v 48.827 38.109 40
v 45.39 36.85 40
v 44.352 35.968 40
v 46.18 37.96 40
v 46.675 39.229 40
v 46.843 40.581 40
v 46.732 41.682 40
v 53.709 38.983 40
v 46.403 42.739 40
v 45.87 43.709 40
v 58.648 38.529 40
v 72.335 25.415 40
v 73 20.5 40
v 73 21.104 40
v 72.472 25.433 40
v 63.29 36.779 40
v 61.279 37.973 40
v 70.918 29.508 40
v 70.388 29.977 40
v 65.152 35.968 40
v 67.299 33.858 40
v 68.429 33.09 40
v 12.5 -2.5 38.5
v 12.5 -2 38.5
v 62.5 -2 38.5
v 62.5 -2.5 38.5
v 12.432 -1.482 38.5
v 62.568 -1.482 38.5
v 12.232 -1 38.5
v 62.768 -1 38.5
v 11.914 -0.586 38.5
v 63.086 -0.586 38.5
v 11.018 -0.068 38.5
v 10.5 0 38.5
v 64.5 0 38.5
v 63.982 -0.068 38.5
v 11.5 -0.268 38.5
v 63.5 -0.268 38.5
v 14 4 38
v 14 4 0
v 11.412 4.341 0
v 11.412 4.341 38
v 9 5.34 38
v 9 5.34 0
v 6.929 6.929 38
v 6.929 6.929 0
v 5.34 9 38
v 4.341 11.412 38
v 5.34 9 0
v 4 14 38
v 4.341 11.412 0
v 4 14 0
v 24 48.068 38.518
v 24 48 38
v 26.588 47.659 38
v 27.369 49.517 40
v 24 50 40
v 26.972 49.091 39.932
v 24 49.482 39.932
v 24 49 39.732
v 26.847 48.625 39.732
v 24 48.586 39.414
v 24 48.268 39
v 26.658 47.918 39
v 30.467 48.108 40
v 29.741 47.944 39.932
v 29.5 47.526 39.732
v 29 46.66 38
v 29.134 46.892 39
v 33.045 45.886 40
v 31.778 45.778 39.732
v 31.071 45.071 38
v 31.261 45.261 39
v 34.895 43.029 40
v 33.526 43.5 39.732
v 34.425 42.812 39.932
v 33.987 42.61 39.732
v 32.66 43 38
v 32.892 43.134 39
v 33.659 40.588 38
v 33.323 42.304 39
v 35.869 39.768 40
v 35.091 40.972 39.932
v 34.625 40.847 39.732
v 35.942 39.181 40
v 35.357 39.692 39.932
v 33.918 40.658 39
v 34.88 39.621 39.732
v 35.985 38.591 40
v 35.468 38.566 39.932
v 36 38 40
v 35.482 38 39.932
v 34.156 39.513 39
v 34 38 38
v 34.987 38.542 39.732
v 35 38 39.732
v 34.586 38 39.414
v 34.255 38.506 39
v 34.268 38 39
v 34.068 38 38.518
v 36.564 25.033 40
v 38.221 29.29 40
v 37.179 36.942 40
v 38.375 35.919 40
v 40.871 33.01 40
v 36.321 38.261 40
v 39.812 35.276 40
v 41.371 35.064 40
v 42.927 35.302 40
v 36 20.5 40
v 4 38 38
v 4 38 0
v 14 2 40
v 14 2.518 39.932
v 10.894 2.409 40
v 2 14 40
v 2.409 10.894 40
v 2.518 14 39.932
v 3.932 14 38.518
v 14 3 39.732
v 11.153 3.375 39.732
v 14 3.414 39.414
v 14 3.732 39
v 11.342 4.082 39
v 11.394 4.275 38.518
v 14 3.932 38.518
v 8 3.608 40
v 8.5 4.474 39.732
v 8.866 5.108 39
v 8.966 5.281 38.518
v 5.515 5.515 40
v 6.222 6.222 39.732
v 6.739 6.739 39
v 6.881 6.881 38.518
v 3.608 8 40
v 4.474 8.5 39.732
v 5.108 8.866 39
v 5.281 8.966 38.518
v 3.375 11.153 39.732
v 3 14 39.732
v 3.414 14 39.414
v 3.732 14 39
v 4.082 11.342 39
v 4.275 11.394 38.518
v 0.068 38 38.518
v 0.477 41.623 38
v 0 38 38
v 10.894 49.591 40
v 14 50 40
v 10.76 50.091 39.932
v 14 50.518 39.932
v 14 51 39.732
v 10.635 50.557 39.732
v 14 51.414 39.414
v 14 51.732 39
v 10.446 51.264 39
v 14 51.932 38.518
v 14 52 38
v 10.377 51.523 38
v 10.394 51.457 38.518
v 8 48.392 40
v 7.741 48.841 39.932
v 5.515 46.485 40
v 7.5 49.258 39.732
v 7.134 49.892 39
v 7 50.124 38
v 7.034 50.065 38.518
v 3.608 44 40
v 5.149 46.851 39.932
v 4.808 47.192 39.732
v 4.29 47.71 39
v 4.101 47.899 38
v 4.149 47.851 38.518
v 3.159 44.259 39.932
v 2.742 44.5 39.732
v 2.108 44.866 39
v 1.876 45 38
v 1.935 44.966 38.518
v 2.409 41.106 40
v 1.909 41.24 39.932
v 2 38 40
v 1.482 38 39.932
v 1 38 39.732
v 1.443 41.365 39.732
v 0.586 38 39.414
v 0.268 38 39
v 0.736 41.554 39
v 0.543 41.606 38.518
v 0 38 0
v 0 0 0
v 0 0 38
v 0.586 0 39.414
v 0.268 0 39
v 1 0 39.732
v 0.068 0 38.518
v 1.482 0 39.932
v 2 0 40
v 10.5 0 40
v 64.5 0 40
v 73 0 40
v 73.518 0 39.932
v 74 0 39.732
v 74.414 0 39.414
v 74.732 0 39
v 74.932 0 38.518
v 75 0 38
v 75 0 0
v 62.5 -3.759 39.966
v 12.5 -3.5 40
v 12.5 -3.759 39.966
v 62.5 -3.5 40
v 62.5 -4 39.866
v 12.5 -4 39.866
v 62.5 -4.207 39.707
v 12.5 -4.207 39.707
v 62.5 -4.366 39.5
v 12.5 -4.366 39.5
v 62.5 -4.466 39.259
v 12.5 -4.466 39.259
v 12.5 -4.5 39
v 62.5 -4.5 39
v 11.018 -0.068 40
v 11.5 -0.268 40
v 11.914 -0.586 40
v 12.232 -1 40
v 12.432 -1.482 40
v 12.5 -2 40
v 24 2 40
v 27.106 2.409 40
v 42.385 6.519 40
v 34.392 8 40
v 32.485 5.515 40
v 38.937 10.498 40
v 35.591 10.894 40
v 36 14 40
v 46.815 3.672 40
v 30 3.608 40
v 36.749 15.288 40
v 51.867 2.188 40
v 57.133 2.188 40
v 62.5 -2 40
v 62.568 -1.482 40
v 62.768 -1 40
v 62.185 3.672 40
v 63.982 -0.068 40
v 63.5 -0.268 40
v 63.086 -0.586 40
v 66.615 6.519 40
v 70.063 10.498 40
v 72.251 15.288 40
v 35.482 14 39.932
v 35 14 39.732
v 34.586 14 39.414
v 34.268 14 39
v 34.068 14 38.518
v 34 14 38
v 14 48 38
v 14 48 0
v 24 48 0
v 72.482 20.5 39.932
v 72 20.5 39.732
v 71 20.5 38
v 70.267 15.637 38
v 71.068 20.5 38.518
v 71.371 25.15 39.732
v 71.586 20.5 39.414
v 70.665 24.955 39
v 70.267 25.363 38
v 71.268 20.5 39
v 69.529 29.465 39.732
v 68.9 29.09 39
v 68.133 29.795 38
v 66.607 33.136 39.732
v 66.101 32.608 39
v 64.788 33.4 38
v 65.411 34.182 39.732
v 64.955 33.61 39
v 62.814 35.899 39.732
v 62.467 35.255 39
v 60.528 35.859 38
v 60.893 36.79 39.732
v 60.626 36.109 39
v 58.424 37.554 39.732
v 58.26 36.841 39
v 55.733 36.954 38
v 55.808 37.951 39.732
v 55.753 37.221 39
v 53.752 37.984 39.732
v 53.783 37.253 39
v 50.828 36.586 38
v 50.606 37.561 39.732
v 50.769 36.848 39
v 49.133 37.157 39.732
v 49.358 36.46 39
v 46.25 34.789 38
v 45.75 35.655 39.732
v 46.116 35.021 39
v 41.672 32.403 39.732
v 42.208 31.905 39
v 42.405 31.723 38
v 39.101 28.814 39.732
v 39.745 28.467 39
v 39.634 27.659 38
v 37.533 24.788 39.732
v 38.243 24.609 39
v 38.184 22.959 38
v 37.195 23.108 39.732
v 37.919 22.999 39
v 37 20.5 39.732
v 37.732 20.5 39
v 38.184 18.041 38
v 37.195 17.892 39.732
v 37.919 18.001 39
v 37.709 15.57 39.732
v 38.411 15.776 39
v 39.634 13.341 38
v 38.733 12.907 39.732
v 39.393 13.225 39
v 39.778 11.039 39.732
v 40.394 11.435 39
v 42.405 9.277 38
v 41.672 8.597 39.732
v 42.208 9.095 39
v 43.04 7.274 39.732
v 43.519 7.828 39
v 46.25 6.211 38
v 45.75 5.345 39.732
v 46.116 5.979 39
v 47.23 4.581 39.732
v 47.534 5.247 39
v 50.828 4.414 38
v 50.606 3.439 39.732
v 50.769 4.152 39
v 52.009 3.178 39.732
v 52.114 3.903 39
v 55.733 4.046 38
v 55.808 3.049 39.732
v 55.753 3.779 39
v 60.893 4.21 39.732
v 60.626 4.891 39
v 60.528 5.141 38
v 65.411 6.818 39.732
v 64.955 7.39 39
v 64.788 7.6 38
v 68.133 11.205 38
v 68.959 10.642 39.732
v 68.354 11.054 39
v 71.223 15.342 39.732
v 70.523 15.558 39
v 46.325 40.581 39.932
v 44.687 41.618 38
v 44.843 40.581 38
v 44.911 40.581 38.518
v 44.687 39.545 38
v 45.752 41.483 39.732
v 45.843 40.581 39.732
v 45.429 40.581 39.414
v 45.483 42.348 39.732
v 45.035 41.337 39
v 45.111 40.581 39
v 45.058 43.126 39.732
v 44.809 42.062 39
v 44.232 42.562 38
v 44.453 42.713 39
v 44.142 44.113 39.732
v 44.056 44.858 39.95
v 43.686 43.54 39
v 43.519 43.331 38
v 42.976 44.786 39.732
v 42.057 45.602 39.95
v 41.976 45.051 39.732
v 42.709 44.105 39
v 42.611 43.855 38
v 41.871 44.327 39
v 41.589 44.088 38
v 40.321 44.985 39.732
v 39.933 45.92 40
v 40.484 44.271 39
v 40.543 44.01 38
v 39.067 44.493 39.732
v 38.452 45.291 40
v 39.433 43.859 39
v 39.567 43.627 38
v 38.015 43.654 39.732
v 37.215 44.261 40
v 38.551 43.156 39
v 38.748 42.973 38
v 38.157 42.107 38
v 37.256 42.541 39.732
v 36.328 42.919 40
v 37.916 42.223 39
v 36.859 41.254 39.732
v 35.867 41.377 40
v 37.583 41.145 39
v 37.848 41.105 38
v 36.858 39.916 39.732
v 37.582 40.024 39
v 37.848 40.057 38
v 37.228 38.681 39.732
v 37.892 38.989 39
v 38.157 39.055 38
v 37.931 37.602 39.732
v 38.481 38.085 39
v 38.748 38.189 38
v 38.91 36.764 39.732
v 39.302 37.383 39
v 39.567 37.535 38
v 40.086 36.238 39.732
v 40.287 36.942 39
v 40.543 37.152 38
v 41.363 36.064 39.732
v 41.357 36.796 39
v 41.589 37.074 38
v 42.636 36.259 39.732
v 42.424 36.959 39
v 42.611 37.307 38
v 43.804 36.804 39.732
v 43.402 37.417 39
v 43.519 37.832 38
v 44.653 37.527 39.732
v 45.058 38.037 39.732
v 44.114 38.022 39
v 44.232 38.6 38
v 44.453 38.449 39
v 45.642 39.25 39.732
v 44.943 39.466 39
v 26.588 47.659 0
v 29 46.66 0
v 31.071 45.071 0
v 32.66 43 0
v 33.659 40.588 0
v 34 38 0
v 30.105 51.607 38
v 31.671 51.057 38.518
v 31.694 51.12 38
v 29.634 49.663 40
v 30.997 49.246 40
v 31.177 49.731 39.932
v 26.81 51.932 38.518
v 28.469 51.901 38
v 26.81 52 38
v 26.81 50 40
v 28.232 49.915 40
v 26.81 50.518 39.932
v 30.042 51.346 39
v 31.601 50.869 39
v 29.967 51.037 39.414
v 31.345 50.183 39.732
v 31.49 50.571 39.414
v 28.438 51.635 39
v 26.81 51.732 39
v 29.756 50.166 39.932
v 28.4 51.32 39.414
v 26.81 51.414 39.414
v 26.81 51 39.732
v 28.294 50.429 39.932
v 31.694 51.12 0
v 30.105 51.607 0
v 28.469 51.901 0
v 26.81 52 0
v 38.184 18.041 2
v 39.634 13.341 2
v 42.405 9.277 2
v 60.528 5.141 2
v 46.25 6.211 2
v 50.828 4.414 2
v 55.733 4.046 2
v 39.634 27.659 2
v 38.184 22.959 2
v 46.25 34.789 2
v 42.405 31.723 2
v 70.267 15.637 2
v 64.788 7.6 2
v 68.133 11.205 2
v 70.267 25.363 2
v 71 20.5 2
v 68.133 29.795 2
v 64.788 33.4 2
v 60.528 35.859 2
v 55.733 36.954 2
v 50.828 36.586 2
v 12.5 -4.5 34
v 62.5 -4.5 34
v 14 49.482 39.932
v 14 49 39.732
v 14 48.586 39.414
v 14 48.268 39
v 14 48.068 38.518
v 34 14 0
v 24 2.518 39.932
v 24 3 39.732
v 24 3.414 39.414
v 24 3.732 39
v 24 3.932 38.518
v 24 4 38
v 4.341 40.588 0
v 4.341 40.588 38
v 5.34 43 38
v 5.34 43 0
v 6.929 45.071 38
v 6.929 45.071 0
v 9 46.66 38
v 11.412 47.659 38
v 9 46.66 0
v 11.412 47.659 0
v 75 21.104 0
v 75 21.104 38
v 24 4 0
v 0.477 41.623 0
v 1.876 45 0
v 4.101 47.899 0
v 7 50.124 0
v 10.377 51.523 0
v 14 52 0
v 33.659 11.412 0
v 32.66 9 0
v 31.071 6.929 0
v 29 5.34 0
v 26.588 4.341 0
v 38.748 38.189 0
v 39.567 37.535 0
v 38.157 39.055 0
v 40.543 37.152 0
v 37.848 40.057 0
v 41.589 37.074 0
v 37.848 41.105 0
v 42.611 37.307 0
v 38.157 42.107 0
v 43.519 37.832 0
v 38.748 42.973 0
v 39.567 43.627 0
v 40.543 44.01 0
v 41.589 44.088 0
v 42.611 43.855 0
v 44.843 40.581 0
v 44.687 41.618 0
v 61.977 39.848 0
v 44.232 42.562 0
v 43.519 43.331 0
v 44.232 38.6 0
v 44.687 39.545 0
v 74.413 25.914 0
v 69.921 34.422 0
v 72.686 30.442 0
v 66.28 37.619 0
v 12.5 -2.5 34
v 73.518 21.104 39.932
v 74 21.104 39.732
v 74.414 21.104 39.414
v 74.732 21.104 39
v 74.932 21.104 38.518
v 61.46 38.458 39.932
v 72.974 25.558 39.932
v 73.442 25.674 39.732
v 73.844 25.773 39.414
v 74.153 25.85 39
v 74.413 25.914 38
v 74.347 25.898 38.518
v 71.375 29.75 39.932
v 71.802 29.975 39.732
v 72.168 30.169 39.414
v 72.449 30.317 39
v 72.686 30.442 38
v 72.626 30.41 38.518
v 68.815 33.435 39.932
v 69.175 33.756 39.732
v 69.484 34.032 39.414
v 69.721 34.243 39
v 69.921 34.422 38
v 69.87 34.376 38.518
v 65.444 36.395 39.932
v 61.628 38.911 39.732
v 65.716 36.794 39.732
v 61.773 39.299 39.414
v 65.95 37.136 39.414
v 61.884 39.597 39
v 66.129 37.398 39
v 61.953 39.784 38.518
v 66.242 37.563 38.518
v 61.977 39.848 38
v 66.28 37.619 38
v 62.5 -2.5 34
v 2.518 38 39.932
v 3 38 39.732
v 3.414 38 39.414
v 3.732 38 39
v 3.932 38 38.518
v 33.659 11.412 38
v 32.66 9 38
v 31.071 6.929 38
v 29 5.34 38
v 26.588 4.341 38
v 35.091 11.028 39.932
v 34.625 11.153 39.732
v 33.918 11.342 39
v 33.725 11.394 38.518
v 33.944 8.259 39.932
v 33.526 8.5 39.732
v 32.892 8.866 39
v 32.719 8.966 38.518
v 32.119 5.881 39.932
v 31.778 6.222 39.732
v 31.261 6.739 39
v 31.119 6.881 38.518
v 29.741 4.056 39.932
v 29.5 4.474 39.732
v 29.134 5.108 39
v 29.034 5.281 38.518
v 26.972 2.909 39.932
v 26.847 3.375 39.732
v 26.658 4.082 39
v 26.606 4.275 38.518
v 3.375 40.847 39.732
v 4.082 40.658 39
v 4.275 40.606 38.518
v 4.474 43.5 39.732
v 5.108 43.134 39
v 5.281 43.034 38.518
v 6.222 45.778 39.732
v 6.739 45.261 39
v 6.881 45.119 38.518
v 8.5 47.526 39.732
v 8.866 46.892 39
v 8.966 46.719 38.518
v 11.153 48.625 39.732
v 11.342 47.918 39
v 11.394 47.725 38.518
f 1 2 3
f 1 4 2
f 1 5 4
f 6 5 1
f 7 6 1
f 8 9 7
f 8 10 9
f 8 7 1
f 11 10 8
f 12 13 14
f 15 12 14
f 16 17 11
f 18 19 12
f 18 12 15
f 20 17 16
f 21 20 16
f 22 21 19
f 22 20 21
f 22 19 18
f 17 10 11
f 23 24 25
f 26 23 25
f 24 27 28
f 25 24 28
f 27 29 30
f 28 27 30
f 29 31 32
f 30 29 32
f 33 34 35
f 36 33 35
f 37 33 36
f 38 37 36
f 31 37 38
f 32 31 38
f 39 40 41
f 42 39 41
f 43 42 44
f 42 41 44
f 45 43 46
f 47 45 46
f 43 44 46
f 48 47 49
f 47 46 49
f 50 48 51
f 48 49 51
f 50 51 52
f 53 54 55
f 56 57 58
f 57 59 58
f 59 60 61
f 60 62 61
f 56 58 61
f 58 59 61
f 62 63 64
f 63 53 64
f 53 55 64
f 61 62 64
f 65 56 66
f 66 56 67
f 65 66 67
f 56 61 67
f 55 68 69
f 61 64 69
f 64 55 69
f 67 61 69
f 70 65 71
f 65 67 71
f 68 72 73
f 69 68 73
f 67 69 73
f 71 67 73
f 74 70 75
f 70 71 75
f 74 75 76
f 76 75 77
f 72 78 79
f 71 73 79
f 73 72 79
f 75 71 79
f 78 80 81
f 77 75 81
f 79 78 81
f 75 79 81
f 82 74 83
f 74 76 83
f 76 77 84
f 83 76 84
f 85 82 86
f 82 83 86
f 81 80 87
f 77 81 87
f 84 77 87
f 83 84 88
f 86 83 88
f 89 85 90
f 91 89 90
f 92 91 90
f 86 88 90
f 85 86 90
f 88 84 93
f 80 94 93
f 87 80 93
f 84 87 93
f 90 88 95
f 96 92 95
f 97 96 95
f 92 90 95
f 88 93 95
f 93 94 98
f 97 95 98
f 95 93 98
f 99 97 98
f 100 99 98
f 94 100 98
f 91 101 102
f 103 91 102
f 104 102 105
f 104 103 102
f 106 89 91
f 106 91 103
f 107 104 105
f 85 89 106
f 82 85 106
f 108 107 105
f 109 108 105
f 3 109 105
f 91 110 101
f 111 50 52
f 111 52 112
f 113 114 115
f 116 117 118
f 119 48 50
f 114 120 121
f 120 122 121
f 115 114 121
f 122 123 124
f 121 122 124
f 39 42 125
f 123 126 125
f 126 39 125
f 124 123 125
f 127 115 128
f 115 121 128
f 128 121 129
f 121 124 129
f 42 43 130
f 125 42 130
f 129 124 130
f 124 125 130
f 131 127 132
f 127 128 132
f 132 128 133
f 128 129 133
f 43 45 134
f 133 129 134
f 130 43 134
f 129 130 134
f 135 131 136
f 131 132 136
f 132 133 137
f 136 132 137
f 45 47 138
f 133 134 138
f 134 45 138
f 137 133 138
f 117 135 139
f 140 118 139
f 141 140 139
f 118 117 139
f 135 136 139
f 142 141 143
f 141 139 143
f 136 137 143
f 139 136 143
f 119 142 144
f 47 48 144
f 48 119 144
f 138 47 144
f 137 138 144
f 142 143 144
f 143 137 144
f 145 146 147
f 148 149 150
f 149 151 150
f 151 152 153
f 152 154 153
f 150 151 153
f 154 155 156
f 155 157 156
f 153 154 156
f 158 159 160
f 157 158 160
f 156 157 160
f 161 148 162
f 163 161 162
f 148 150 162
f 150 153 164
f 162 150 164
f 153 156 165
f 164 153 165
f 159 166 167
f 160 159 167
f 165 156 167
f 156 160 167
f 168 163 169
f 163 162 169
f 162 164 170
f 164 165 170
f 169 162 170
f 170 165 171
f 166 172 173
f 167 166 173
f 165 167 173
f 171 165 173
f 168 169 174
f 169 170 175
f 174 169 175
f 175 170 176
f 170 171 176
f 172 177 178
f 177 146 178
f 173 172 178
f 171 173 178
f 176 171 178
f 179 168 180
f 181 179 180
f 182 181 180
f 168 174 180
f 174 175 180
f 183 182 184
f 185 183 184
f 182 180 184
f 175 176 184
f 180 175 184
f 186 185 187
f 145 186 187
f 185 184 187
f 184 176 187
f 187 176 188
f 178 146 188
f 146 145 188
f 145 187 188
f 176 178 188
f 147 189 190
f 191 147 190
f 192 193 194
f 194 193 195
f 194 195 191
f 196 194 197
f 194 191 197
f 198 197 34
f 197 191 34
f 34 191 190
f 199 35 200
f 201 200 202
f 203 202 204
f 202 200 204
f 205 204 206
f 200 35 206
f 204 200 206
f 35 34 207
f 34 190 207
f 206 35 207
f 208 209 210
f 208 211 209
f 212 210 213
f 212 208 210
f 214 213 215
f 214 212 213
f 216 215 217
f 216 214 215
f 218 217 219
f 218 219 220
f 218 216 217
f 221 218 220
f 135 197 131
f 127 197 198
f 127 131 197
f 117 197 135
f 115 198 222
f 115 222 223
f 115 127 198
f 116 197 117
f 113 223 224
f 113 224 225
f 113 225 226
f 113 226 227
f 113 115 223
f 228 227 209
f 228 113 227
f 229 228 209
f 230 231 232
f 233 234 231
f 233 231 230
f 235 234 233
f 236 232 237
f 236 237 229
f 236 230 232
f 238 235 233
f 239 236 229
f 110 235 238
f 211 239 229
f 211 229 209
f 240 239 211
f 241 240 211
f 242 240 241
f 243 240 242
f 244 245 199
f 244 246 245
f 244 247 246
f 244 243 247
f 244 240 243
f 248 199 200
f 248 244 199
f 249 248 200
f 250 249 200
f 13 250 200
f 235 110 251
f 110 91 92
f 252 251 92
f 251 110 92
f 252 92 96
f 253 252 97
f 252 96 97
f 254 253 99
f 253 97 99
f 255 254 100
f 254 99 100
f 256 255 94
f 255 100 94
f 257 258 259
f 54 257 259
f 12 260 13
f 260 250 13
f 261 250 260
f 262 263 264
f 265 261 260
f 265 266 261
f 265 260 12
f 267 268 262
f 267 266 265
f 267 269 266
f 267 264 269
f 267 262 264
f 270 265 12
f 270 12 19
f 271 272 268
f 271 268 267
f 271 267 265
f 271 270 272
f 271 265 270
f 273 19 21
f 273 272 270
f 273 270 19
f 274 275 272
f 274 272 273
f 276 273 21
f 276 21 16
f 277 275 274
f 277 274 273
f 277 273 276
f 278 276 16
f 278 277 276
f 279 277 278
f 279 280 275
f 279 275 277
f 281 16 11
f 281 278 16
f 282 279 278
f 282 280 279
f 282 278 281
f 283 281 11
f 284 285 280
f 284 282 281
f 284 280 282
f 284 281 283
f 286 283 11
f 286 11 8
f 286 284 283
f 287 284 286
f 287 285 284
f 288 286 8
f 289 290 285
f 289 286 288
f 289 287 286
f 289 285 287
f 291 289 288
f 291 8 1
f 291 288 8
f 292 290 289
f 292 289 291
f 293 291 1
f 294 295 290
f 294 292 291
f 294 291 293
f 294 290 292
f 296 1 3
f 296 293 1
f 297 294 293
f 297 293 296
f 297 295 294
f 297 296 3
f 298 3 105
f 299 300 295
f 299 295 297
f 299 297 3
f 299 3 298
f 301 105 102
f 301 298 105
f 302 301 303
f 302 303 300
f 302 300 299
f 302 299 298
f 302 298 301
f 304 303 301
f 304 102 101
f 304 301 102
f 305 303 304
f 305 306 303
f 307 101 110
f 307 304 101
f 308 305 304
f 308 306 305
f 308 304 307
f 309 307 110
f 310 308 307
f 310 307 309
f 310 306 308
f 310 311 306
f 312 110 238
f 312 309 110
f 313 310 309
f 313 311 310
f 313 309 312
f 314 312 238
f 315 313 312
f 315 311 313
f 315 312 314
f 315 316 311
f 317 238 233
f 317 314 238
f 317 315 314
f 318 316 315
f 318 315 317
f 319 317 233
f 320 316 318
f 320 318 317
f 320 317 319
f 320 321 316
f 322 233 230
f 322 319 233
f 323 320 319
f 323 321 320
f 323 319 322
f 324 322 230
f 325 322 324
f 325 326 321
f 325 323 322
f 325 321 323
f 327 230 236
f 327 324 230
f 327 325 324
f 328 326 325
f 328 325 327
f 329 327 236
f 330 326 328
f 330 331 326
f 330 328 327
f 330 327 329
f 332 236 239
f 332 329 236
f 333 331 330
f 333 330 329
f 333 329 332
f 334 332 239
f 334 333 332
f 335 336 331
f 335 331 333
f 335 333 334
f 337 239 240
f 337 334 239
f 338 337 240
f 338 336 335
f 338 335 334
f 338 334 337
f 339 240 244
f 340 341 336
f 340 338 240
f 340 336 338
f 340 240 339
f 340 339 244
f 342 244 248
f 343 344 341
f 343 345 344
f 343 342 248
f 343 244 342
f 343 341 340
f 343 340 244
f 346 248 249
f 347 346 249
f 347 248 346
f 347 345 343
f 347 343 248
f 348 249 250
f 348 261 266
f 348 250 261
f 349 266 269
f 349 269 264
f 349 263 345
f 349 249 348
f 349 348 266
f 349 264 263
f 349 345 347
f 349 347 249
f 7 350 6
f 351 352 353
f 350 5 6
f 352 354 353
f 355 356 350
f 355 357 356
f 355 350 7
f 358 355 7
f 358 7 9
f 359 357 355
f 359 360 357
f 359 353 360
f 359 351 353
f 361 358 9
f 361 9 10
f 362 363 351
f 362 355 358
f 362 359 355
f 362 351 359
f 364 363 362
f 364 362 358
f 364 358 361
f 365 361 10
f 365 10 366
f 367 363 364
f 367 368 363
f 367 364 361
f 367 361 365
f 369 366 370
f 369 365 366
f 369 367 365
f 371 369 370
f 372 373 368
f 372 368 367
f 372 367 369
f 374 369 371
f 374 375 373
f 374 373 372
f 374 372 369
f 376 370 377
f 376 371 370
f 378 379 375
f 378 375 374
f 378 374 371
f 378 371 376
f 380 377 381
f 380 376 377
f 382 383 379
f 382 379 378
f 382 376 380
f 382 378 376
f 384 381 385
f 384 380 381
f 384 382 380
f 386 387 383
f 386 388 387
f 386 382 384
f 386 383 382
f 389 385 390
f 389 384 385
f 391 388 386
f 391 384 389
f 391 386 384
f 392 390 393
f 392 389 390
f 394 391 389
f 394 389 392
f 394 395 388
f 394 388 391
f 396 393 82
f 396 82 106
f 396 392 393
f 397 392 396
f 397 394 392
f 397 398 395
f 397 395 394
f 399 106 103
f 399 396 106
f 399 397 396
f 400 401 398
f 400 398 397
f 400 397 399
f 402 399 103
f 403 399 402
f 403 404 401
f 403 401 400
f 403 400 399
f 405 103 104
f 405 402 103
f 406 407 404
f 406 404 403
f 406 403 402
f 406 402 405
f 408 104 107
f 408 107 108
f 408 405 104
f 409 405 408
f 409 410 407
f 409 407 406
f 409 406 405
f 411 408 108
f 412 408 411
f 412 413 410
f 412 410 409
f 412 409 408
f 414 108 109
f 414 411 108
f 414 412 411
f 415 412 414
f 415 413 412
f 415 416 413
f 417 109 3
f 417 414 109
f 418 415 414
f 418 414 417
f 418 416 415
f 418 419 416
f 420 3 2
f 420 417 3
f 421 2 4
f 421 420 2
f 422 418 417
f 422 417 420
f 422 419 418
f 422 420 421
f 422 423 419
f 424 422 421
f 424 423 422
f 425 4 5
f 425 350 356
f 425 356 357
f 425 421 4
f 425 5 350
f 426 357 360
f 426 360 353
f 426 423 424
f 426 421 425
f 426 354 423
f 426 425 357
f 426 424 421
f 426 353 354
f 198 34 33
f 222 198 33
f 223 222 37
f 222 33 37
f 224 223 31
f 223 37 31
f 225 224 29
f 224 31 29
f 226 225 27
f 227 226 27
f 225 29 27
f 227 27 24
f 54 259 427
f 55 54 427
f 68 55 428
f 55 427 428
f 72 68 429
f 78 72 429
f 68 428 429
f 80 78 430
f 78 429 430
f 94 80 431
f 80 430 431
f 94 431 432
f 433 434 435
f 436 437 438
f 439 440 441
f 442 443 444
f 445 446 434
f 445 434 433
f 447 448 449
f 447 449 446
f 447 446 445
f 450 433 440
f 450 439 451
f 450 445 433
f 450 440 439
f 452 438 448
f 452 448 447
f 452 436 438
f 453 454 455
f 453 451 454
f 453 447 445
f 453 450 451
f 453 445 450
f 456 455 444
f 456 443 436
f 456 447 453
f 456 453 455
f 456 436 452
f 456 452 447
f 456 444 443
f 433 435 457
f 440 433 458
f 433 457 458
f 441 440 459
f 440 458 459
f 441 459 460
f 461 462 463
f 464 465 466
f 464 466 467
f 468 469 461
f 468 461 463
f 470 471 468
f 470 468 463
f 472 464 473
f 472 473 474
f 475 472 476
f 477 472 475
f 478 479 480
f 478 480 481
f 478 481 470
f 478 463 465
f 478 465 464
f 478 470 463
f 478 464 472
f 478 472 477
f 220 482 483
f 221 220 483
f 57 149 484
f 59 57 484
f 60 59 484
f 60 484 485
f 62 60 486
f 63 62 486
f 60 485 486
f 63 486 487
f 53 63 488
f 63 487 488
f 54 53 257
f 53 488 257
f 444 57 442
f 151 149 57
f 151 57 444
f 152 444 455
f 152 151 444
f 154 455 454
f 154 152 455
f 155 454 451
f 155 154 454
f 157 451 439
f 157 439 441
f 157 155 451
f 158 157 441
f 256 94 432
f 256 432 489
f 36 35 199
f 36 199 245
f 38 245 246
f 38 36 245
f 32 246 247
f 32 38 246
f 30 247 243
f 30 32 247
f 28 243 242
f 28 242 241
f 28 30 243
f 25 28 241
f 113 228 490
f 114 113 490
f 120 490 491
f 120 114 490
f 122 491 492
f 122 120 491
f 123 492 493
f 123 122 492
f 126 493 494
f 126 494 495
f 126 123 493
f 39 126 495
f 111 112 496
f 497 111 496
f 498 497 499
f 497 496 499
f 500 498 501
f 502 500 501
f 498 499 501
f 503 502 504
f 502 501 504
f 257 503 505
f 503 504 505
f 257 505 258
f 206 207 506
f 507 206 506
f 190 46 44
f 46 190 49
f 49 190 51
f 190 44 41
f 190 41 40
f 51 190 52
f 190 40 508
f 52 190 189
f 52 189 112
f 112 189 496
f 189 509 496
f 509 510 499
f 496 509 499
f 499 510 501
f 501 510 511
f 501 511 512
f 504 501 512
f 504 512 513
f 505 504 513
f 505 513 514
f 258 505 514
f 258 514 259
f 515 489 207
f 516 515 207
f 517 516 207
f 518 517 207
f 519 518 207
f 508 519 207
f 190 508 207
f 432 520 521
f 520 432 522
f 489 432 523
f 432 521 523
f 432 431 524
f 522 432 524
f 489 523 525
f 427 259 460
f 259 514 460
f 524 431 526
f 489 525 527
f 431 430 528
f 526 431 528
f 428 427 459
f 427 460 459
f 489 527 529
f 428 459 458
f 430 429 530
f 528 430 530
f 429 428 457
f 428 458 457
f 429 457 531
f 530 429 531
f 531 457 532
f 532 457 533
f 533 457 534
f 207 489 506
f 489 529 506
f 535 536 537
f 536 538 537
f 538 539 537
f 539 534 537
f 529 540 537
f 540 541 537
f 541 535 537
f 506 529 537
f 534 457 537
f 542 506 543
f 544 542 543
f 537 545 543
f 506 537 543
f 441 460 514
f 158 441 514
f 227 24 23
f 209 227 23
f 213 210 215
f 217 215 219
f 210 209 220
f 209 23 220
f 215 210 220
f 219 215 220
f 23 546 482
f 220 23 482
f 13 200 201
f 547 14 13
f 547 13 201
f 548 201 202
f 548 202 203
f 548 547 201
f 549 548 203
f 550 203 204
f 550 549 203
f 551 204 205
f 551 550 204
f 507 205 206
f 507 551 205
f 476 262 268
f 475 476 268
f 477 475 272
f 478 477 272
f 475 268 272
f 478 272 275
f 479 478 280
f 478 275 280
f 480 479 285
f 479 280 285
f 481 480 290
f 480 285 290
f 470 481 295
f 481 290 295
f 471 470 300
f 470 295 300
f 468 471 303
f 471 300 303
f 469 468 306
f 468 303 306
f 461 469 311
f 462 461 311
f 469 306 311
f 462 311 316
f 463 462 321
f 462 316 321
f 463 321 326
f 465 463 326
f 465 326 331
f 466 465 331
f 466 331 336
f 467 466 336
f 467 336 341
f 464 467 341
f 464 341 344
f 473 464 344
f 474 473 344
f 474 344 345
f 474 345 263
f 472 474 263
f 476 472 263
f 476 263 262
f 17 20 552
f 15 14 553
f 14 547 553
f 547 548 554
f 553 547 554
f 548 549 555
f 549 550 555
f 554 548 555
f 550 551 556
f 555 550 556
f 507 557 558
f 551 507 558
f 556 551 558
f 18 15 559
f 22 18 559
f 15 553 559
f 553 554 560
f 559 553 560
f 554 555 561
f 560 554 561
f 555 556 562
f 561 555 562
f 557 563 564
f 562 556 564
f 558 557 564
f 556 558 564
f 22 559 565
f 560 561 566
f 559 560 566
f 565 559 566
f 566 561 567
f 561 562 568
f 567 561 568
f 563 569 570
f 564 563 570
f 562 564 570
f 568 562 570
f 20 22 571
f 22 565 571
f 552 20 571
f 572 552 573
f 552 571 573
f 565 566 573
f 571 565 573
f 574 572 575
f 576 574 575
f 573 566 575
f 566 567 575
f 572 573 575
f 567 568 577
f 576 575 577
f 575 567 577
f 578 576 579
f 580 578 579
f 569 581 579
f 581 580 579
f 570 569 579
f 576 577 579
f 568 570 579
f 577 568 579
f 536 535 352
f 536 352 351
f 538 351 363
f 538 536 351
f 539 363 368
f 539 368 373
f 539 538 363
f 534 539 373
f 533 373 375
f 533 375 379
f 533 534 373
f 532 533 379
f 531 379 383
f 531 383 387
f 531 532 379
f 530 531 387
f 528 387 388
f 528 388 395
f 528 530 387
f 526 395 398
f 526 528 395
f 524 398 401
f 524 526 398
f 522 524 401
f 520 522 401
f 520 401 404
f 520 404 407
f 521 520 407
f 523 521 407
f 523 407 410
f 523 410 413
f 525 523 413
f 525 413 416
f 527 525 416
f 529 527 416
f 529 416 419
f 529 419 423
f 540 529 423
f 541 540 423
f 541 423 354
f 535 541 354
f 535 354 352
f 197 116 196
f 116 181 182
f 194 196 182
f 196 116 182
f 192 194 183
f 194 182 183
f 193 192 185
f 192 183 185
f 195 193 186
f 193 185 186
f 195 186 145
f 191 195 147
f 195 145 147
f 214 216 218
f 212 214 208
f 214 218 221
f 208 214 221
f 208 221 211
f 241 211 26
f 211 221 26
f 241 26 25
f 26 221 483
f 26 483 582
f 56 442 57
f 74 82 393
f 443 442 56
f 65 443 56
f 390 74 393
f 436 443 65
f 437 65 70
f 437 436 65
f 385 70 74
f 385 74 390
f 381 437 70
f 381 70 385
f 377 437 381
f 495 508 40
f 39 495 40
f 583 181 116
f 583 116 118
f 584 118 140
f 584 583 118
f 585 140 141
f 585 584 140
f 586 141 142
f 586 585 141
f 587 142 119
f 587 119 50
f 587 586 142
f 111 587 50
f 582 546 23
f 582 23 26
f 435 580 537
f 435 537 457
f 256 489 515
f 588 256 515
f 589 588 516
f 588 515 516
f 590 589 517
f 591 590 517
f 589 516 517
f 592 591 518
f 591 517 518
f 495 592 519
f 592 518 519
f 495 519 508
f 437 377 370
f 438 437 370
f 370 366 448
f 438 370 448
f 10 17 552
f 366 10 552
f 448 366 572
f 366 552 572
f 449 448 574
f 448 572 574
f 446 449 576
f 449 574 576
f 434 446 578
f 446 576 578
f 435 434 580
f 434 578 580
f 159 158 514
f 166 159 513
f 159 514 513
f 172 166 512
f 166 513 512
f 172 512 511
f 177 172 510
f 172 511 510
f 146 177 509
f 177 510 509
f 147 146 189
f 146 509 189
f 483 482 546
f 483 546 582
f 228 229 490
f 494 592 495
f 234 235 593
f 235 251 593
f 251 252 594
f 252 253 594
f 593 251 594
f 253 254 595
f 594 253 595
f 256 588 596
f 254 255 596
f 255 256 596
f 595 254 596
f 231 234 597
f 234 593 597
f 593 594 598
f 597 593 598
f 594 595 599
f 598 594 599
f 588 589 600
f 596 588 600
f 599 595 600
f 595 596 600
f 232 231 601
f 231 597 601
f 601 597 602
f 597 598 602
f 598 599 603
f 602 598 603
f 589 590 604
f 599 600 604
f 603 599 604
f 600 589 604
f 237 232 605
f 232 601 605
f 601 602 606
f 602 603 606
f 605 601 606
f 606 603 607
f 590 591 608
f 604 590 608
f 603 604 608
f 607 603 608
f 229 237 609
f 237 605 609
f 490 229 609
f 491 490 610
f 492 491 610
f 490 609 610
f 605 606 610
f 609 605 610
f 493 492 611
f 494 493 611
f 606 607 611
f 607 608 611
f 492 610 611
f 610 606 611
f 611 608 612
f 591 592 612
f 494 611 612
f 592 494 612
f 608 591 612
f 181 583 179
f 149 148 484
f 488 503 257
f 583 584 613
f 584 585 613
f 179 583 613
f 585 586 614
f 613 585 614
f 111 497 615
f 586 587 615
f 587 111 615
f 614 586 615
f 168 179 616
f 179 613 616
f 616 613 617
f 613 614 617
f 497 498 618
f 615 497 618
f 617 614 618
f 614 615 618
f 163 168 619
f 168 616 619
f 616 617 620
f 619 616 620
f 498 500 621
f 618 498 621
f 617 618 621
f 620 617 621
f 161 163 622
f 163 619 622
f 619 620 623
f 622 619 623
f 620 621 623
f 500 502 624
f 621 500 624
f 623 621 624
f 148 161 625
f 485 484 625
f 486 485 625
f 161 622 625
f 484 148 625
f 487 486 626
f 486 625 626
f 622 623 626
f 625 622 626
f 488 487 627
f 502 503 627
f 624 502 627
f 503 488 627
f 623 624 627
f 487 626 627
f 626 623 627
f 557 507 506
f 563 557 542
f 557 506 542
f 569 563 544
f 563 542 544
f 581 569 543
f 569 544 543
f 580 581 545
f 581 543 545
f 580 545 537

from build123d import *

# Parameters (mm, degrees)
F0_R         = 16.5
F0_R_2       = 3.5170103203
F1_DEPTH     = 40
F2_R         = 16.5
F3_DEPTH     = 38
F4_W         = 50
F4_H         = 34
F5_DEPTH     = 4.5
F6_W         = 50
F6_H         = 2.5
F7_DEPTH     = 4.5
F8_T1_DEPTH  = 1.5
F8_T3_DEPTH  = 24
F8_T5_DEPTH  = 32.3129968036
F8_T7_DEPTH  = 12.8102496977
F8_T9_DEPTH  = 43
F8_T11_DEPTH = 26.1042093904
F8_T13_DEPTH = 10
F8_T20_ANGLE = 69.5823366889
F8_T22_ANGLE = 20.4176633111
F8_T24_ANGLE = 90
F8_T26_ANGLE = 90
F8_T28_ANGLE = 90
F8_T30_ANGLE = 90
F8_T32_ANGLE = 90
F9_R         = 1


# Not quite as in the source:
# - a fillet or chamfer that OpenCascade refuses, or shapes differently, is made with other operations: its cross-section is extruded or revolved along the edge and cut away or added


with BuildPart() as f1:
    # F0 (on Top) → F1 (new body)
    with BuildSketch(Plane.XY):
        with BuildLine():
            Line((0, 38), (0, 0))
            Line((0, 0), (12.5, 0))
            Line((12.5, 0), (12.5, -4.5))
            Line((12.5, -4.5), (62.5, -4.5))
            Line((62.5, -4.5), (62.5, 0))
            Line((62.5, 0), (75, 0))
            Line((75, 0), (75, 21.1042093904))
            ThreePointArc((75, 21.1042093904), (71.4247434001, 32.5159491456), (61.9772195759, 39.8476991132))
            Line((61.9772195759, 39.8476991132), (31.6943034009, 51.120442806))
            ThreePointArc((31.6943034009, 51.120442806), (29.2915599077, 51.7783562025), (26.8102496977, 52))
            Line((26.8102496977, 52), (14, 52))
            ThreePointArc((14, 52), (4.1005050634, 47.8994949366), (0, 38))
        make_face()
        with Locations((54.5, 20.5)):
            Circle(F0_R, mode=Mode.SUBTRACT)
        with BuildLine():
            ThreePointArc((4, 38), (6.9289321881, 45.0710678119), (14, 48))
            Line((14, 48), (24, 48))
            ThreePointArc((24, 48), (31.0710678119, 45.0710678119), (34, 38))
            Line((34, 38), (34, 14))
            ThreePointArc((34, 14), (31.0710678119, 6.9289321881), (24, 4))
            Line((24, 4), (14, 4))
            ThreePointArc((14, 4), (6.9289321881, 6.9289321881), (4, 14))
            Line((4, 14), (4, 38))
        make_face(mode=Mode.SUBTRACT)
        with Locations((41.3257834749, 40.5812550323)):
            Circle(F0_R_2, mode=Mode.SUBTRACT)
        with Locations((54.5, 20.5)):
            Circle(F0_R)
    extrude(amount=F1_DEPTH)

    # F2 (on face) → F3 (cut)
    with BuildSketch(Plane.XY.offset(40)):
        with Locations((54.5, 20.5)):
            Circle(F2_R)
    extrude(amount=-F3_DEPTH, mode=Mode.SUBTRACT)

    # F4 (on face) → F5 (cut)
    with BuildSketch(Plane.XZ.offset(4.5)):
        with Locations((37.5, 17)):
            Rectangle(F4_W, F4_H)
    extrude(amount=-F5_DEPTH, mode=Mode.SUBTRACT)

    # F6 (on face) → F7 (cut)
    with BuildSketch(Plane(origin=(0, 0, 34), x_dir=(1, 0, 0), z_dir=(0, 0, -1))):
        with Locations((37.5, 1.25)):
            Rectangle(F6_W, F6_H)
    extrude(amount=-F7_DEPTH, mode=Mode.SUBTRACT)

    # F8: fillet of radius 2 on 6 edges, made by hand

    # F8_s2 → F8_t1 (join)
    with BuildSketch(Plane.XY.offset(38.5)):
        with BuildLine():
            ThreePointArc((10.5, 0), (11.9142135624, -0.5857864376), (12.5, -2))
            Line((12.5, -2), (12.5, 0))
            Line((12.5, 0), (10.5, 0))
        make_face()
        with BuildLine():
            ThreePointArc((64.5, 0), (63.0857864376, -0.5857864376), (62.5, -2))
            Line((62.5, -2), (62.5, 0))
            Line((62.5, 0), (64.5, 0))
        make_face()
    extrude(amount=F8_T1_DEPTH)

    # F8_s4 → F8_t3 (cut)
    with BuildSketch(Plane.XZ.offset(-38)):
        with BuildLine():
            ThreePointArc((36, 40), (34.5857864376, 39.4142135624), (34, 38))
            Line((34, 38), (34, 40))
            Line((34, 40), (36, 40))
        make_face()
        with BuildLine():
            ThreePointArc((2, 40), (3.4142135624, 39.4142135624), (4, 38))
            Line((4, 38), (4, 40))
            Line((4, 40), (2, 40))
        make_face()
    extrude(amount=F8_T3_DEPTH, mode=Mode.SUBTRACT)

    # F8_s6 → F8_t5 (cut)
    with BuildSketch(Plane(origin=(41.4063945876, -15.4134321387, 0), x_dir=(0, 0, 1), z_dir=(-0.9371744861, 0.3488609788, 0))):
        with BuildLine():
            ThreePointArc((40, 56.9656804247), (39.4142135624, 58.3798939871), (38, 58.9656804247))
            Line((38, 58.9656804247), (40, 58.9656804247))
            Line((40, 58.9656804247), (40, 56.9656804247))
        make_face()
    extrude(amount=F8_T5_DEPTH, mode=Mode.SUBTRACT)

    # F8_s8 → F8_t7 (cut)
    with BuildSketch(Plane.YZ.offset(14)):
        with BuildLine():
            ThreePointArc((50, 40), (51.4142135624, 39.4142135624), (52, 38))
            Line((52, 38), (52, 40))
            Line((52, 40), (50, 40))
        make_face()
    extrude(amount=F8_T7_DEPTH, mode=Mode.SUBTRACT)

    # F8_s10 → F8_t9 (cut)
    with BuildSketch(Plane.XZ.offset(-38)):
        with BuildLine():
            ThreePointArc((2, 40), (0.5857864376, 39.4142135624), (0, 38))
            Line((0, 38), (0, 40))
            Line((0, 40), (2, 40))
        make_face()
    extrude(amount=F8_T9_DEPTH, mode=Mode.SUBTRACT)

    # F8_s12 → F8_t11 (cut)
    with BuildSketch(Plane.XZ.offset(-21.1042093904)):
        with BuildLine():
            ThreePointArc((73, 40), (74.4142135624, 39.4142135624), (75, 38))
            Line((75, 38), (75, 40))
            Line((75, 40), (73, 40))
        make_face()
    extrude(amount=F8_T11_DEPTH, mode=Mode.SUBTRACT)

    # F8_s14 → F8_t13 (cut)
    with BuildSketch(Plane.YZ.offset(14)):
        with BuildLine():
            ThreePointArc((2, 40), (3.4142135624, 39.4142135624), (4, 38))
            Line((4, 38), (4, 40))
            Line((4, 40), (2, 40))
        make_face()
        with BuildLine():
            ThreePointArc((50, 40), (48.5857864376, 39.4142135624), (48, 38))
            Line((48, 38), (48, 40))
            Line((48, 40), (50, 40))
        make_face()
    extrude(amount=F8_T13_DEPTH, mode=Mode.SUBTRACT)

    # F8_s15 → F8_t16 (revolve, cut)
    with BuildSketch(Plane.XZ.offset(-20.5)):
        with BuildLine():
            ThreePointArc((73, 40), (71.5857864376, 39.4142135624), (71, 38))
            Line((71, 38), (71, 40))
            Line((71, 40), (73, 40))
        make_face()
    revolve(axis=Axis((54.5, 20.5, 40), (0, 0, 1)), mode=Mode.SUBTRACT)

    # F8_s17 → F8_t18 (revolve, cut)
    with BuildSketch(Plane.XZ.offset(-40.5812550323)):
        with BuildLine():
            ThreePointArc((46.8427937951, 40), (45.4285802328, 39.4142135624), (44.8427937951, 38))
            Line((44.8427937951, 38), (44.8427937951, 40))
            Line((44.8427937951, 40), (46.8427937951, 40))
        make_face()
    revolve(axis=Axis((41.3257834749, 40.5812550323, 40), (0, 0, 1)), mode=Mode.SUBTRACT)

    # F8_s19 → F8_t20 (revolve, cut)
    with BuildSketch(Plane.XZ.offset(-21.1042093904)):
        with BuildLine():
            ThreePointArc((73, 40), (74.4142135624, 39.4142135624), (75, 38))
            Line((75, 38), (75, 40))
            Line((75, 40), (73, 40))
        make_face()
    revolve(axis=Axis((55, 21.1042093904, 40), (0, 0, 1)), revolution_arc=F8_T20_ANGLE, mode=Mode.SUBTRACT)

    # F8_s21 → F8_t22 (revolve, cut)
    with BuildSketch(Plane(origin=(11.1234784125, -4.140688446, 0), x_dir=(0, 0, 1), z_dir=(0.9371744861, -0.3488609788, 0))):
        with BuildLine():
            ThreePointArc((38, -58.9656804247), (39.4142135624, -58.3798939871), (40, -56.9656804247))
            Line((40, -56.9656804247), (40, -58.9656804247))
            Line((40, -58.9656804247), (38, -58.9656804247))
        make_face()
    revolve(axis=Axis((26.8102496977, 38, 40), (0, 0, 1)), revolution_arc=F8_T22_ANGLE, mode=Mode.SUBTRACT)

    # F8_s23 → F8_t24 (revolve, cut)
    with BuildSketch(Plane.YZ.offset(14)):
        with BuildLine():
            ThreePointArc((50, 40), (51.4142135624, 39.4142135624), (52, 38))
            Line((52, 38), (52, 40))
            Line((52, 40), (50, 40))
        make_face()
    revolve(axis=Axis((14, 38, 40), (0, 0, 1)), revolution_arc=F8_T24_ANGLE, mode=Mode.SUBTRACT)

    # F8_s25 → F8_t26 (revolve, cut)
    with BuildSketch(Plane.YZ.offset(24)):
        with BuildLine():
            ThreePointArc((50, 40), (48.5857864376, 39.4142135624), (48, 38))
            Line((48, 38), (48, 40))
            Line((48, 40), (50, 40))
        make_face()
    revolve(axis=Axis((24, 38, 40), (0, 0, -1)), revolution_arc=F8_T26_ANGLE, mode=Mode.SUBTRACT)

    # F8_s27 → F8_t28 (revolve, cut)
    with BuildSketch(Plane.XZ.offset(-14)):
        with BuildLine():
            ThreePointArc((36, 40), (34.5857864376, 39.4142135624), (34, 38))
            Line((34, 38), (34, 40))
            Line((34, 40), (36, 40))
        make_face()
    revolve(axis=Axis((24, 14, 40), (0, 0, -1)), revolution_arc=F8_T28_ANGLE, mode=Mode.SUBTRACT)

    # F8_s29 → F8_t30 (revolve, cut)
    with BuildSketch(Plane.YZ.offset(14)):
        with BuildLine():
            ThreePointArc((2, 40), (3.4142135624, 39.4142135624), (4, 38))
            Line((4, 38), (4, 40))
            Line((4, 40), (2, 40))
        make_face()
    revolve(axis=Axis((14, 14, 40), (0, 0, -1)), revolution_arc=F8_T30_ANGLE, mode=Mode.SUBTRACT)

    # F8_s31 → F8_t32 (revolve, cut)
    with BuildSketch(Plane.XZ.offset(-38)):
        with BuildLine():
            ThreePointArc((2, 40), (3.4142135624, 39.4142135624), (4, 38))
            Line((4, 38), (4, 40))
            Line((4, 40), (2, 40))
        make_face()
    revolve(axis=Axis((14, 38, 40), (0, 0, -1)), revolution_arc=F8_T32_ANGLE, mode=Mode.SUBTRACT)

    # F9
    f9_edges = [f1.edges().sort_by_distance(p)[0] for p in [
        (37.5, -4.5, 40),
    ]]
    fillet(f9_edges, radius=F9_R)


solid = f1.part
